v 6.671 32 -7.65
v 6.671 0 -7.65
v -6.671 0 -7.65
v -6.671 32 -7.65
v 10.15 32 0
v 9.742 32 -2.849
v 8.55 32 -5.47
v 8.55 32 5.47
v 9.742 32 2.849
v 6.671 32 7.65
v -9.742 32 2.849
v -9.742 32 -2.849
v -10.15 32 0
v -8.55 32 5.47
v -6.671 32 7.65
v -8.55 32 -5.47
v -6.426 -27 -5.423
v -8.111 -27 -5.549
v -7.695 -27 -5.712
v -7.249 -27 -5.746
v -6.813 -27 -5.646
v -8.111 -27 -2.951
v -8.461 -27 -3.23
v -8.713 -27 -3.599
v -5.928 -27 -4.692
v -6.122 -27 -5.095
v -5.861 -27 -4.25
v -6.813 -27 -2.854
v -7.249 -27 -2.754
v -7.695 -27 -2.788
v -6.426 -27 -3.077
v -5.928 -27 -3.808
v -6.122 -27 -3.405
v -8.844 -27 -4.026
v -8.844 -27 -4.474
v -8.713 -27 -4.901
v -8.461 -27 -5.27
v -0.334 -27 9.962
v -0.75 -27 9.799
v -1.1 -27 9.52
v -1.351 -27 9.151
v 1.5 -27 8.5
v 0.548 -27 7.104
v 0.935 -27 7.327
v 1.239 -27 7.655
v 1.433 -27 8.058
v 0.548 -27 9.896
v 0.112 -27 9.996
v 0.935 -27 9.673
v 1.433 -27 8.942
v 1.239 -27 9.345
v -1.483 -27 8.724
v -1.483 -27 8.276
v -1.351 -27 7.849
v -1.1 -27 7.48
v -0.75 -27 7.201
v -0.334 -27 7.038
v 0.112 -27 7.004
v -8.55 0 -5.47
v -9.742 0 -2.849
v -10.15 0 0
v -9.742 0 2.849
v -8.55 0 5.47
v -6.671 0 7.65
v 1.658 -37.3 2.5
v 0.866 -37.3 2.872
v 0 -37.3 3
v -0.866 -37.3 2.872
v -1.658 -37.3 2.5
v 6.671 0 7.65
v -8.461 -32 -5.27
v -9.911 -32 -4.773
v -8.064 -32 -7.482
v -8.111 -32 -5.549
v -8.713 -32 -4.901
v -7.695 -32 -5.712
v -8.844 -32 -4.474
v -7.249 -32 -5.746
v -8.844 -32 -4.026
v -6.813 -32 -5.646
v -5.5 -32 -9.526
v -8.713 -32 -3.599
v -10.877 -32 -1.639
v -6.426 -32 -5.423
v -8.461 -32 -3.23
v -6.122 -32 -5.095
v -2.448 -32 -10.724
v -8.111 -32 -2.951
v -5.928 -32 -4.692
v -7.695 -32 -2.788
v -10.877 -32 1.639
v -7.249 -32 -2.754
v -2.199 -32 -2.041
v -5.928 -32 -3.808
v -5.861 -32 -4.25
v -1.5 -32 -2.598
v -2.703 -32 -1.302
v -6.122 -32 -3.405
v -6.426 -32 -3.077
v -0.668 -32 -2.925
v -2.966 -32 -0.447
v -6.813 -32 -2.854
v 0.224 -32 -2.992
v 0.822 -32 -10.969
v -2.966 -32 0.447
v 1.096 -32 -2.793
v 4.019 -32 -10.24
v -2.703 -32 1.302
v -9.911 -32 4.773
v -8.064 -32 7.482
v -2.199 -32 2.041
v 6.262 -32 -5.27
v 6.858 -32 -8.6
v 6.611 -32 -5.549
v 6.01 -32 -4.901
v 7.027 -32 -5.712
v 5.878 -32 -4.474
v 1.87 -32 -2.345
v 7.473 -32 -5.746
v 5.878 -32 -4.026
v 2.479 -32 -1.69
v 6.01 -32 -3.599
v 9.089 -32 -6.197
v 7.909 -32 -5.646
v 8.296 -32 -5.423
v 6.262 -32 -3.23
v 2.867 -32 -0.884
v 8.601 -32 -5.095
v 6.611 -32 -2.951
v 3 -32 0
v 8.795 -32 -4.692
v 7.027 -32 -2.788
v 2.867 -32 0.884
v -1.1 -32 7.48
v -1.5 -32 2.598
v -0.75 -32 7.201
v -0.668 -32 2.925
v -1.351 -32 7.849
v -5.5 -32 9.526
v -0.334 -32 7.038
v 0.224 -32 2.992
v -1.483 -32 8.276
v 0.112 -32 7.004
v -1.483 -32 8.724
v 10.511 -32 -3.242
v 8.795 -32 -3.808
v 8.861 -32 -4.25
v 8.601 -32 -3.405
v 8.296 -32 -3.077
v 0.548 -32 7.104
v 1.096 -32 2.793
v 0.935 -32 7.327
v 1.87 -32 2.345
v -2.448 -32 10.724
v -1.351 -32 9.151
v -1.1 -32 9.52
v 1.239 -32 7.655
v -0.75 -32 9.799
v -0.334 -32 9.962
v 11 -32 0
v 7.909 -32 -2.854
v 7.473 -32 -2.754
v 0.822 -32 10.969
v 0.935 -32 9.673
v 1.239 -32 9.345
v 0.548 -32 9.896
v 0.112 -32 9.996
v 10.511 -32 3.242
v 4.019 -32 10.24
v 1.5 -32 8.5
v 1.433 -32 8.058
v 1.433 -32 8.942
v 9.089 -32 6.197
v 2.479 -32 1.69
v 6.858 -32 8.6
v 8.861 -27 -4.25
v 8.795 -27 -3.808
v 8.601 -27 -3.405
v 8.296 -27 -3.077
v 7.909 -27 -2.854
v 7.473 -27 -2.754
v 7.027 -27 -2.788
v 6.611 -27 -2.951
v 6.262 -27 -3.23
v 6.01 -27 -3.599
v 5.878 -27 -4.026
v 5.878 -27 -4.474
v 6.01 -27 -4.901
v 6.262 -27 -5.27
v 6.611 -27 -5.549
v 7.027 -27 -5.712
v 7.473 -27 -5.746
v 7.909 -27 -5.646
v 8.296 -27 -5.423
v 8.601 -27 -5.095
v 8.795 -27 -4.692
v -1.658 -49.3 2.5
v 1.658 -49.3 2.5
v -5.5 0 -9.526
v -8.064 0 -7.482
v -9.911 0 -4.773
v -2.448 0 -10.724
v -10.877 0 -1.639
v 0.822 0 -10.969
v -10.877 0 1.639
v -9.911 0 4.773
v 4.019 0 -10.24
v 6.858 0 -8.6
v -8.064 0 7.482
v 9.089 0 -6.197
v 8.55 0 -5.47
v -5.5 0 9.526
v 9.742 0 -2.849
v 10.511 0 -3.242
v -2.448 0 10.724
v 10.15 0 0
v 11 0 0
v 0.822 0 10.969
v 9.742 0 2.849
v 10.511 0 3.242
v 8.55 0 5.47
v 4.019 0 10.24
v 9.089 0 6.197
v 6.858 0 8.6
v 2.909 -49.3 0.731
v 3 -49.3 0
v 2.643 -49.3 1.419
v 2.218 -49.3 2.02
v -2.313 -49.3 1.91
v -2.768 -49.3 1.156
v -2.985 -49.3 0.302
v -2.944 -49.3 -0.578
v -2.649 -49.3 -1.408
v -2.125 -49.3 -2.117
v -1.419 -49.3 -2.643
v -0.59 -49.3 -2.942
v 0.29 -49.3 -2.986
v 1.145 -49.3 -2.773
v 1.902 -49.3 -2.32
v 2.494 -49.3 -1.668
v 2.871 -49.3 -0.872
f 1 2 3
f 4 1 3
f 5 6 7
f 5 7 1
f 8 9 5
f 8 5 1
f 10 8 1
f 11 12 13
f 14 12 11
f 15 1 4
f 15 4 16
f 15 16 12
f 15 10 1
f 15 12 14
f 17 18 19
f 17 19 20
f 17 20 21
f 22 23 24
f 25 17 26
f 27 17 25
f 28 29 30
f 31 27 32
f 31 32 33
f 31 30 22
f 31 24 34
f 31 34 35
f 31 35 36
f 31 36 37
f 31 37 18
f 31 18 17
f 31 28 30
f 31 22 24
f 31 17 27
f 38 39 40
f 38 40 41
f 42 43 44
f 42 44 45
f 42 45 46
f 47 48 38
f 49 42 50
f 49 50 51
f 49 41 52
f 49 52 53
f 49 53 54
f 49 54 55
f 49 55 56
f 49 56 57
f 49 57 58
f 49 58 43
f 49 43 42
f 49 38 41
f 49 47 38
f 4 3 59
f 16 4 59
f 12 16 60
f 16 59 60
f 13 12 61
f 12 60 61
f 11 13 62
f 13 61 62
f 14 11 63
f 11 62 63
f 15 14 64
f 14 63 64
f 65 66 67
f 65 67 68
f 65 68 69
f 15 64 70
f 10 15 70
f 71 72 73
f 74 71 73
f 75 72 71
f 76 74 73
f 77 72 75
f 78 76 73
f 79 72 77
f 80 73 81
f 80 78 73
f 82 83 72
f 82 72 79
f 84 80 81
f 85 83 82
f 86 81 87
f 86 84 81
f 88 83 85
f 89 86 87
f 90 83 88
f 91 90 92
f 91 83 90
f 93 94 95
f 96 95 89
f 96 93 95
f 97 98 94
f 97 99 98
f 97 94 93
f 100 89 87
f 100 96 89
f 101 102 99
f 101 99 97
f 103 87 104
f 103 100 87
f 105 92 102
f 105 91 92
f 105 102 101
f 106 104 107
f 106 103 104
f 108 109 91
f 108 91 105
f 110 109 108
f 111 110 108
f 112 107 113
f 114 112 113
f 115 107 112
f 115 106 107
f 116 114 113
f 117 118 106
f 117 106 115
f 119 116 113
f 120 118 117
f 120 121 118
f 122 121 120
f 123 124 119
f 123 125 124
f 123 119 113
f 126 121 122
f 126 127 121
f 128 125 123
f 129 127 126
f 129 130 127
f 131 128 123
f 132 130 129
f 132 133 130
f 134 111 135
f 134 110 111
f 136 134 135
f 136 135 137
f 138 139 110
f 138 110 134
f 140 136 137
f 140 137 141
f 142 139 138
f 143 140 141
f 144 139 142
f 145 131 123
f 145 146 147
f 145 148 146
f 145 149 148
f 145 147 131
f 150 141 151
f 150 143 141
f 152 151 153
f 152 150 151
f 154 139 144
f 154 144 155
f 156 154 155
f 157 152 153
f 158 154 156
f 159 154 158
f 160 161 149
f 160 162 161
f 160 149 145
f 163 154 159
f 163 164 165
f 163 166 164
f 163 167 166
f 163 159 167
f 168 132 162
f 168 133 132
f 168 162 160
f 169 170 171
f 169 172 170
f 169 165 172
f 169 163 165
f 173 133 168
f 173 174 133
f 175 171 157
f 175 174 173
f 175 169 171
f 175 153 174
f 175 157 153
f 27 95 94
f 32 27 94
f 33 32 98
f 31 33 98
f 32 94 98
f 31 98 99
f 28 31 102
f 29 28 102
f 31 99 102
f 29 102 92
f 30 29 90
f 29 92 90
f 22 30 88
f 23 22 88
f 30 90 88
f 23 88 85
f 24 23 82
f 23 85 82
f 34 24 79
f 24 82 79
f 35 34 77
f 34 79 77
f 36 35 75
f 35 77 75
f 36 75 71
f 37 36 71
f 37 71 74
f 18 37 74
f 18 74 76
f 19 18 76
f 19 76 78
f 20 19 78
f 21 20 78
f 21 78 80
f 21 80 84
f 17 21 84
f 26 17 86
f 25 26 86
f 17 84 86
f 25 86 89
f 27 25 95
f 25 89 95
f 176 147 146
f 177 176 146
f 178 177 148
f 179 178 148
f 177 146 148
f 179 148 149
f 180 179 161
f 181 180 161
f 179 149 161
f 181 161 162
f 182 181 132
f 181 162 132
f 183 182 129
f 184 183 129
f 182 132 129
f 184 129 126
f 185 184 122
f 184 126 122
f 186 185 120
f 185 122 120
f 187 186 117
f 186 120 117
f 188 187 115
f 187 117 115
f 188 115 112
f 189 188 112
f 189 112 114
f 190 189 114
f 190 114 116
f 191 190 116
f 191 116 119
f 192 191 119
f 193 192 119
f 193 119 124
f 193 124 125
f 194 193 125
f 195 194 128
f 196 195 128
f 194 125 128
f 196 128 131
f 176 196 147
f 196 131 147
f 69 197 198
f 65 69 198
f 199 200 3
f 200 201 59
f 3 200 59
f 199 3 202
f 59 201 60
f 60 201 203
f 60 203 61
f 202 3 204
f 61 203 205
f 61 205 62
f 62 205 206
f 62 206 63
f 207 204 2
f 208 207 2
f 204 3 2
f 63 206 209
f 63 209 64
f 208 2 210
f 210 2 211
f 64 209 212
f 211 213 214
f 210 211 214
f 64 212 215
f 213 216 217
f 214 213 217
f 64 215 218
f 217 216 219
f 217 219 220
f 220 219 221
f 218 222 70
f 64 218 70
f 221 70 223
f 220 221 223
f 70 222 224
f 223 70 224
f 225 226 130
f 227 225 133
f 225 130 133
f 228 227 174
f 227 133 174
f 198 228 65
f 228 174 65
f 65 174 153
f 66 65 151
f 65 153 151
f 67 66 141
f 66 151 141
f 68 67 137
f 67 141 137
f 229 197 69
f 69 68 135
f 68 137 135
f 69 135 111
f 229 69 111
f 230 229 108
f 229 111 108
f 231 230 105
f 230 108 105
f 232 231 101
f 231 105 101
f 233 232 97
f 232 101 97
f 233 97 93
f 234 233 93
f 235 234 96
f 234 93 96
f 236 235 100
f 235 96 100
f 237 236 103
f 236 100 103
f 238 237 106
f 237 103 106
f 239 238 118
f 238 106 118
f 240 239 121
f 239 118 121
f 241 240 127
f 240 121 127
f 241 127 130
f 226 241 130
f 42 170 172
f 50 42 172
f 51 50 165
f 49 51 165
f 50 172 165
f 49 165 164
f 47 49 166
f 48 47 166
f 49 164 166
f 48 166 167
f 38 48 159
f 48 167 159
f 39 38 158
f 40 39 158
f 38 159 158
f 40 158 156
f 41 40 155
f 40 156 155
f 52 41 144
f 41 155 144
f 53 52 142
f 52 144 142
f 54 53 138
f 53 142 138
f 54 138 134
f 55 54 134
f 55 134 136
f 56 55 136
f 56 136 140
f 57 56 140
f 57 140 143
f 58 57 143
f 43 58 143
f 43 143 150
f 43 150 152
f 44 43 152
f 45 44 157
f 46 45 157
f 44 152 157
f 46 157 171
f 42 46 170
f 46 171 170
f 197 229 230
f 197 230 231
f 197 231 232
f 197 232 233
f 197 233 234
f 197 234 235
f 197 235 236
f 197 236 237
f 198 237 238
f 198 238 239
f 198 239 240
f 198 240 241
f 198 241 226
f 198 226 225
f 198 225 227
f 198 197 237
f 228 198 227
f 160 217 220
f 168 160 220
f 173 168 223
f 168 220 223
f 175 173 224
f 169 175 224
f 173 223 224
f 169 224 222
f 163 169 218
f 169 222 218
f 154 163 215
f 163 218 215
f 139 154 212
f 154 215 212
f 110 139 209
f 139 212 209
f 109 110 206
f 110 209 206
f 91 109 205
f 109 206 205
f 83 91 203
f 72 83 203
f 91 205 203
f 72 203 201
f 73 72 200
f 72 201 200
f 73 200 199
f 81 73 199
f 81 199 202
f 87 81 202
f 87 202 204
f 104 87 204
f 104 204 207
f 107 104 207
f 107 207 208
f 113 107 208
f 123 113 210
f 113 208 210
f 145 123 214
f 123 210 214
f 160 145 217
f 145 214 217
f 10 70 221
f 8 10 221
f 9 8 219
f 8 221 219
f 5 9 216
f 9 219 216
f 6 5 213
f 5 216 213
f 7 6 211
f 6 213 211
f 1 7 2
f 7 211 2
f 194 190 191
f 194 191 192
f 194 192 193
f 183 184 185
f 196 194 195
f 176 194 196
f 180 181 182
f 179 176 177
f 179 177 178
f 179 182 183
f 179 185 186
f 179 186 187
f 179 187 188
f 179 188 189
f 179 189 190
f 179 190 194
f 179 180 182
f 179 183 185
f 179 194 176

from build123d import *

# Parameters (mm, degrees)
F0_R     = 11
F1_DEPTH = 32
F2_R     = 1.5
F3_DEPTH = 5
F5_DEPTH = 32
F6_R     = 3
F7_DEPTH = 17.3
F9_DEPTH = 12


with BuildPart() as f1:
    # F0 (on Front) → F1 (new body)
    with BuildSketch(Plane.XZ):
        Circle(F0_R)
    extrude(amount=F1_DEPTH)

    # F2 (on face) → F3 (cut)
    with BuildSketch(Plane.XZ.offset(32)):
        with Locations((0, 8.5)):
            Circle(F2_R)
        with Locations((-7.361216, -4.25)):
            Circle(F2_R)
        with Locations((7.361216, -4.25)):
            Circle(F2_R)
    extrude(amount=-F3_DEPTH, mode=Mode.SUBTRACT)

    # F4 (on face) → F5 (join)
    with BuildSketch(Plane(origin=(0, 0, 0), x_dir=(-1, 0, 0), z_dir=(0, 1, 0))):
        with BuildLine():
            Line((6.670832, 7.65), (-6.670832, 7.65))
            ThreePointArc((-6.670832, 7.65), (-10.15, 0), (-6.670832, -7.65))
            Line((-6.670832, -7.65), (6.670832, -7.65))
            ThreePointArc((6.670832, -7.65), (10.15, 0), (6.670832, 7.65))
        make_face()
    extrude(amount=F5_DEPTH)

    # F6 (on face) → F7 (join)
    with BuildSketch(Plane.XZ.offset(32)):
        Circle(F6_R)
    extrude(amount=F7_DEPTH)

    # F8 (on face) → F9 (cut)
    with BuildSketch(Plane.XZ.offset(49.3)):
        with BuildLine():
            ThreePointArc((1.658312, 2.5), (0, 3), (-1.658312, 2.5))
            Line((-1.658312, 2.5), (1.658312, 2.5))
        make_face()
    extrude(amount=-F9_DEPTH, mode=Mode.SUBTRACT)


solid = f1.part
